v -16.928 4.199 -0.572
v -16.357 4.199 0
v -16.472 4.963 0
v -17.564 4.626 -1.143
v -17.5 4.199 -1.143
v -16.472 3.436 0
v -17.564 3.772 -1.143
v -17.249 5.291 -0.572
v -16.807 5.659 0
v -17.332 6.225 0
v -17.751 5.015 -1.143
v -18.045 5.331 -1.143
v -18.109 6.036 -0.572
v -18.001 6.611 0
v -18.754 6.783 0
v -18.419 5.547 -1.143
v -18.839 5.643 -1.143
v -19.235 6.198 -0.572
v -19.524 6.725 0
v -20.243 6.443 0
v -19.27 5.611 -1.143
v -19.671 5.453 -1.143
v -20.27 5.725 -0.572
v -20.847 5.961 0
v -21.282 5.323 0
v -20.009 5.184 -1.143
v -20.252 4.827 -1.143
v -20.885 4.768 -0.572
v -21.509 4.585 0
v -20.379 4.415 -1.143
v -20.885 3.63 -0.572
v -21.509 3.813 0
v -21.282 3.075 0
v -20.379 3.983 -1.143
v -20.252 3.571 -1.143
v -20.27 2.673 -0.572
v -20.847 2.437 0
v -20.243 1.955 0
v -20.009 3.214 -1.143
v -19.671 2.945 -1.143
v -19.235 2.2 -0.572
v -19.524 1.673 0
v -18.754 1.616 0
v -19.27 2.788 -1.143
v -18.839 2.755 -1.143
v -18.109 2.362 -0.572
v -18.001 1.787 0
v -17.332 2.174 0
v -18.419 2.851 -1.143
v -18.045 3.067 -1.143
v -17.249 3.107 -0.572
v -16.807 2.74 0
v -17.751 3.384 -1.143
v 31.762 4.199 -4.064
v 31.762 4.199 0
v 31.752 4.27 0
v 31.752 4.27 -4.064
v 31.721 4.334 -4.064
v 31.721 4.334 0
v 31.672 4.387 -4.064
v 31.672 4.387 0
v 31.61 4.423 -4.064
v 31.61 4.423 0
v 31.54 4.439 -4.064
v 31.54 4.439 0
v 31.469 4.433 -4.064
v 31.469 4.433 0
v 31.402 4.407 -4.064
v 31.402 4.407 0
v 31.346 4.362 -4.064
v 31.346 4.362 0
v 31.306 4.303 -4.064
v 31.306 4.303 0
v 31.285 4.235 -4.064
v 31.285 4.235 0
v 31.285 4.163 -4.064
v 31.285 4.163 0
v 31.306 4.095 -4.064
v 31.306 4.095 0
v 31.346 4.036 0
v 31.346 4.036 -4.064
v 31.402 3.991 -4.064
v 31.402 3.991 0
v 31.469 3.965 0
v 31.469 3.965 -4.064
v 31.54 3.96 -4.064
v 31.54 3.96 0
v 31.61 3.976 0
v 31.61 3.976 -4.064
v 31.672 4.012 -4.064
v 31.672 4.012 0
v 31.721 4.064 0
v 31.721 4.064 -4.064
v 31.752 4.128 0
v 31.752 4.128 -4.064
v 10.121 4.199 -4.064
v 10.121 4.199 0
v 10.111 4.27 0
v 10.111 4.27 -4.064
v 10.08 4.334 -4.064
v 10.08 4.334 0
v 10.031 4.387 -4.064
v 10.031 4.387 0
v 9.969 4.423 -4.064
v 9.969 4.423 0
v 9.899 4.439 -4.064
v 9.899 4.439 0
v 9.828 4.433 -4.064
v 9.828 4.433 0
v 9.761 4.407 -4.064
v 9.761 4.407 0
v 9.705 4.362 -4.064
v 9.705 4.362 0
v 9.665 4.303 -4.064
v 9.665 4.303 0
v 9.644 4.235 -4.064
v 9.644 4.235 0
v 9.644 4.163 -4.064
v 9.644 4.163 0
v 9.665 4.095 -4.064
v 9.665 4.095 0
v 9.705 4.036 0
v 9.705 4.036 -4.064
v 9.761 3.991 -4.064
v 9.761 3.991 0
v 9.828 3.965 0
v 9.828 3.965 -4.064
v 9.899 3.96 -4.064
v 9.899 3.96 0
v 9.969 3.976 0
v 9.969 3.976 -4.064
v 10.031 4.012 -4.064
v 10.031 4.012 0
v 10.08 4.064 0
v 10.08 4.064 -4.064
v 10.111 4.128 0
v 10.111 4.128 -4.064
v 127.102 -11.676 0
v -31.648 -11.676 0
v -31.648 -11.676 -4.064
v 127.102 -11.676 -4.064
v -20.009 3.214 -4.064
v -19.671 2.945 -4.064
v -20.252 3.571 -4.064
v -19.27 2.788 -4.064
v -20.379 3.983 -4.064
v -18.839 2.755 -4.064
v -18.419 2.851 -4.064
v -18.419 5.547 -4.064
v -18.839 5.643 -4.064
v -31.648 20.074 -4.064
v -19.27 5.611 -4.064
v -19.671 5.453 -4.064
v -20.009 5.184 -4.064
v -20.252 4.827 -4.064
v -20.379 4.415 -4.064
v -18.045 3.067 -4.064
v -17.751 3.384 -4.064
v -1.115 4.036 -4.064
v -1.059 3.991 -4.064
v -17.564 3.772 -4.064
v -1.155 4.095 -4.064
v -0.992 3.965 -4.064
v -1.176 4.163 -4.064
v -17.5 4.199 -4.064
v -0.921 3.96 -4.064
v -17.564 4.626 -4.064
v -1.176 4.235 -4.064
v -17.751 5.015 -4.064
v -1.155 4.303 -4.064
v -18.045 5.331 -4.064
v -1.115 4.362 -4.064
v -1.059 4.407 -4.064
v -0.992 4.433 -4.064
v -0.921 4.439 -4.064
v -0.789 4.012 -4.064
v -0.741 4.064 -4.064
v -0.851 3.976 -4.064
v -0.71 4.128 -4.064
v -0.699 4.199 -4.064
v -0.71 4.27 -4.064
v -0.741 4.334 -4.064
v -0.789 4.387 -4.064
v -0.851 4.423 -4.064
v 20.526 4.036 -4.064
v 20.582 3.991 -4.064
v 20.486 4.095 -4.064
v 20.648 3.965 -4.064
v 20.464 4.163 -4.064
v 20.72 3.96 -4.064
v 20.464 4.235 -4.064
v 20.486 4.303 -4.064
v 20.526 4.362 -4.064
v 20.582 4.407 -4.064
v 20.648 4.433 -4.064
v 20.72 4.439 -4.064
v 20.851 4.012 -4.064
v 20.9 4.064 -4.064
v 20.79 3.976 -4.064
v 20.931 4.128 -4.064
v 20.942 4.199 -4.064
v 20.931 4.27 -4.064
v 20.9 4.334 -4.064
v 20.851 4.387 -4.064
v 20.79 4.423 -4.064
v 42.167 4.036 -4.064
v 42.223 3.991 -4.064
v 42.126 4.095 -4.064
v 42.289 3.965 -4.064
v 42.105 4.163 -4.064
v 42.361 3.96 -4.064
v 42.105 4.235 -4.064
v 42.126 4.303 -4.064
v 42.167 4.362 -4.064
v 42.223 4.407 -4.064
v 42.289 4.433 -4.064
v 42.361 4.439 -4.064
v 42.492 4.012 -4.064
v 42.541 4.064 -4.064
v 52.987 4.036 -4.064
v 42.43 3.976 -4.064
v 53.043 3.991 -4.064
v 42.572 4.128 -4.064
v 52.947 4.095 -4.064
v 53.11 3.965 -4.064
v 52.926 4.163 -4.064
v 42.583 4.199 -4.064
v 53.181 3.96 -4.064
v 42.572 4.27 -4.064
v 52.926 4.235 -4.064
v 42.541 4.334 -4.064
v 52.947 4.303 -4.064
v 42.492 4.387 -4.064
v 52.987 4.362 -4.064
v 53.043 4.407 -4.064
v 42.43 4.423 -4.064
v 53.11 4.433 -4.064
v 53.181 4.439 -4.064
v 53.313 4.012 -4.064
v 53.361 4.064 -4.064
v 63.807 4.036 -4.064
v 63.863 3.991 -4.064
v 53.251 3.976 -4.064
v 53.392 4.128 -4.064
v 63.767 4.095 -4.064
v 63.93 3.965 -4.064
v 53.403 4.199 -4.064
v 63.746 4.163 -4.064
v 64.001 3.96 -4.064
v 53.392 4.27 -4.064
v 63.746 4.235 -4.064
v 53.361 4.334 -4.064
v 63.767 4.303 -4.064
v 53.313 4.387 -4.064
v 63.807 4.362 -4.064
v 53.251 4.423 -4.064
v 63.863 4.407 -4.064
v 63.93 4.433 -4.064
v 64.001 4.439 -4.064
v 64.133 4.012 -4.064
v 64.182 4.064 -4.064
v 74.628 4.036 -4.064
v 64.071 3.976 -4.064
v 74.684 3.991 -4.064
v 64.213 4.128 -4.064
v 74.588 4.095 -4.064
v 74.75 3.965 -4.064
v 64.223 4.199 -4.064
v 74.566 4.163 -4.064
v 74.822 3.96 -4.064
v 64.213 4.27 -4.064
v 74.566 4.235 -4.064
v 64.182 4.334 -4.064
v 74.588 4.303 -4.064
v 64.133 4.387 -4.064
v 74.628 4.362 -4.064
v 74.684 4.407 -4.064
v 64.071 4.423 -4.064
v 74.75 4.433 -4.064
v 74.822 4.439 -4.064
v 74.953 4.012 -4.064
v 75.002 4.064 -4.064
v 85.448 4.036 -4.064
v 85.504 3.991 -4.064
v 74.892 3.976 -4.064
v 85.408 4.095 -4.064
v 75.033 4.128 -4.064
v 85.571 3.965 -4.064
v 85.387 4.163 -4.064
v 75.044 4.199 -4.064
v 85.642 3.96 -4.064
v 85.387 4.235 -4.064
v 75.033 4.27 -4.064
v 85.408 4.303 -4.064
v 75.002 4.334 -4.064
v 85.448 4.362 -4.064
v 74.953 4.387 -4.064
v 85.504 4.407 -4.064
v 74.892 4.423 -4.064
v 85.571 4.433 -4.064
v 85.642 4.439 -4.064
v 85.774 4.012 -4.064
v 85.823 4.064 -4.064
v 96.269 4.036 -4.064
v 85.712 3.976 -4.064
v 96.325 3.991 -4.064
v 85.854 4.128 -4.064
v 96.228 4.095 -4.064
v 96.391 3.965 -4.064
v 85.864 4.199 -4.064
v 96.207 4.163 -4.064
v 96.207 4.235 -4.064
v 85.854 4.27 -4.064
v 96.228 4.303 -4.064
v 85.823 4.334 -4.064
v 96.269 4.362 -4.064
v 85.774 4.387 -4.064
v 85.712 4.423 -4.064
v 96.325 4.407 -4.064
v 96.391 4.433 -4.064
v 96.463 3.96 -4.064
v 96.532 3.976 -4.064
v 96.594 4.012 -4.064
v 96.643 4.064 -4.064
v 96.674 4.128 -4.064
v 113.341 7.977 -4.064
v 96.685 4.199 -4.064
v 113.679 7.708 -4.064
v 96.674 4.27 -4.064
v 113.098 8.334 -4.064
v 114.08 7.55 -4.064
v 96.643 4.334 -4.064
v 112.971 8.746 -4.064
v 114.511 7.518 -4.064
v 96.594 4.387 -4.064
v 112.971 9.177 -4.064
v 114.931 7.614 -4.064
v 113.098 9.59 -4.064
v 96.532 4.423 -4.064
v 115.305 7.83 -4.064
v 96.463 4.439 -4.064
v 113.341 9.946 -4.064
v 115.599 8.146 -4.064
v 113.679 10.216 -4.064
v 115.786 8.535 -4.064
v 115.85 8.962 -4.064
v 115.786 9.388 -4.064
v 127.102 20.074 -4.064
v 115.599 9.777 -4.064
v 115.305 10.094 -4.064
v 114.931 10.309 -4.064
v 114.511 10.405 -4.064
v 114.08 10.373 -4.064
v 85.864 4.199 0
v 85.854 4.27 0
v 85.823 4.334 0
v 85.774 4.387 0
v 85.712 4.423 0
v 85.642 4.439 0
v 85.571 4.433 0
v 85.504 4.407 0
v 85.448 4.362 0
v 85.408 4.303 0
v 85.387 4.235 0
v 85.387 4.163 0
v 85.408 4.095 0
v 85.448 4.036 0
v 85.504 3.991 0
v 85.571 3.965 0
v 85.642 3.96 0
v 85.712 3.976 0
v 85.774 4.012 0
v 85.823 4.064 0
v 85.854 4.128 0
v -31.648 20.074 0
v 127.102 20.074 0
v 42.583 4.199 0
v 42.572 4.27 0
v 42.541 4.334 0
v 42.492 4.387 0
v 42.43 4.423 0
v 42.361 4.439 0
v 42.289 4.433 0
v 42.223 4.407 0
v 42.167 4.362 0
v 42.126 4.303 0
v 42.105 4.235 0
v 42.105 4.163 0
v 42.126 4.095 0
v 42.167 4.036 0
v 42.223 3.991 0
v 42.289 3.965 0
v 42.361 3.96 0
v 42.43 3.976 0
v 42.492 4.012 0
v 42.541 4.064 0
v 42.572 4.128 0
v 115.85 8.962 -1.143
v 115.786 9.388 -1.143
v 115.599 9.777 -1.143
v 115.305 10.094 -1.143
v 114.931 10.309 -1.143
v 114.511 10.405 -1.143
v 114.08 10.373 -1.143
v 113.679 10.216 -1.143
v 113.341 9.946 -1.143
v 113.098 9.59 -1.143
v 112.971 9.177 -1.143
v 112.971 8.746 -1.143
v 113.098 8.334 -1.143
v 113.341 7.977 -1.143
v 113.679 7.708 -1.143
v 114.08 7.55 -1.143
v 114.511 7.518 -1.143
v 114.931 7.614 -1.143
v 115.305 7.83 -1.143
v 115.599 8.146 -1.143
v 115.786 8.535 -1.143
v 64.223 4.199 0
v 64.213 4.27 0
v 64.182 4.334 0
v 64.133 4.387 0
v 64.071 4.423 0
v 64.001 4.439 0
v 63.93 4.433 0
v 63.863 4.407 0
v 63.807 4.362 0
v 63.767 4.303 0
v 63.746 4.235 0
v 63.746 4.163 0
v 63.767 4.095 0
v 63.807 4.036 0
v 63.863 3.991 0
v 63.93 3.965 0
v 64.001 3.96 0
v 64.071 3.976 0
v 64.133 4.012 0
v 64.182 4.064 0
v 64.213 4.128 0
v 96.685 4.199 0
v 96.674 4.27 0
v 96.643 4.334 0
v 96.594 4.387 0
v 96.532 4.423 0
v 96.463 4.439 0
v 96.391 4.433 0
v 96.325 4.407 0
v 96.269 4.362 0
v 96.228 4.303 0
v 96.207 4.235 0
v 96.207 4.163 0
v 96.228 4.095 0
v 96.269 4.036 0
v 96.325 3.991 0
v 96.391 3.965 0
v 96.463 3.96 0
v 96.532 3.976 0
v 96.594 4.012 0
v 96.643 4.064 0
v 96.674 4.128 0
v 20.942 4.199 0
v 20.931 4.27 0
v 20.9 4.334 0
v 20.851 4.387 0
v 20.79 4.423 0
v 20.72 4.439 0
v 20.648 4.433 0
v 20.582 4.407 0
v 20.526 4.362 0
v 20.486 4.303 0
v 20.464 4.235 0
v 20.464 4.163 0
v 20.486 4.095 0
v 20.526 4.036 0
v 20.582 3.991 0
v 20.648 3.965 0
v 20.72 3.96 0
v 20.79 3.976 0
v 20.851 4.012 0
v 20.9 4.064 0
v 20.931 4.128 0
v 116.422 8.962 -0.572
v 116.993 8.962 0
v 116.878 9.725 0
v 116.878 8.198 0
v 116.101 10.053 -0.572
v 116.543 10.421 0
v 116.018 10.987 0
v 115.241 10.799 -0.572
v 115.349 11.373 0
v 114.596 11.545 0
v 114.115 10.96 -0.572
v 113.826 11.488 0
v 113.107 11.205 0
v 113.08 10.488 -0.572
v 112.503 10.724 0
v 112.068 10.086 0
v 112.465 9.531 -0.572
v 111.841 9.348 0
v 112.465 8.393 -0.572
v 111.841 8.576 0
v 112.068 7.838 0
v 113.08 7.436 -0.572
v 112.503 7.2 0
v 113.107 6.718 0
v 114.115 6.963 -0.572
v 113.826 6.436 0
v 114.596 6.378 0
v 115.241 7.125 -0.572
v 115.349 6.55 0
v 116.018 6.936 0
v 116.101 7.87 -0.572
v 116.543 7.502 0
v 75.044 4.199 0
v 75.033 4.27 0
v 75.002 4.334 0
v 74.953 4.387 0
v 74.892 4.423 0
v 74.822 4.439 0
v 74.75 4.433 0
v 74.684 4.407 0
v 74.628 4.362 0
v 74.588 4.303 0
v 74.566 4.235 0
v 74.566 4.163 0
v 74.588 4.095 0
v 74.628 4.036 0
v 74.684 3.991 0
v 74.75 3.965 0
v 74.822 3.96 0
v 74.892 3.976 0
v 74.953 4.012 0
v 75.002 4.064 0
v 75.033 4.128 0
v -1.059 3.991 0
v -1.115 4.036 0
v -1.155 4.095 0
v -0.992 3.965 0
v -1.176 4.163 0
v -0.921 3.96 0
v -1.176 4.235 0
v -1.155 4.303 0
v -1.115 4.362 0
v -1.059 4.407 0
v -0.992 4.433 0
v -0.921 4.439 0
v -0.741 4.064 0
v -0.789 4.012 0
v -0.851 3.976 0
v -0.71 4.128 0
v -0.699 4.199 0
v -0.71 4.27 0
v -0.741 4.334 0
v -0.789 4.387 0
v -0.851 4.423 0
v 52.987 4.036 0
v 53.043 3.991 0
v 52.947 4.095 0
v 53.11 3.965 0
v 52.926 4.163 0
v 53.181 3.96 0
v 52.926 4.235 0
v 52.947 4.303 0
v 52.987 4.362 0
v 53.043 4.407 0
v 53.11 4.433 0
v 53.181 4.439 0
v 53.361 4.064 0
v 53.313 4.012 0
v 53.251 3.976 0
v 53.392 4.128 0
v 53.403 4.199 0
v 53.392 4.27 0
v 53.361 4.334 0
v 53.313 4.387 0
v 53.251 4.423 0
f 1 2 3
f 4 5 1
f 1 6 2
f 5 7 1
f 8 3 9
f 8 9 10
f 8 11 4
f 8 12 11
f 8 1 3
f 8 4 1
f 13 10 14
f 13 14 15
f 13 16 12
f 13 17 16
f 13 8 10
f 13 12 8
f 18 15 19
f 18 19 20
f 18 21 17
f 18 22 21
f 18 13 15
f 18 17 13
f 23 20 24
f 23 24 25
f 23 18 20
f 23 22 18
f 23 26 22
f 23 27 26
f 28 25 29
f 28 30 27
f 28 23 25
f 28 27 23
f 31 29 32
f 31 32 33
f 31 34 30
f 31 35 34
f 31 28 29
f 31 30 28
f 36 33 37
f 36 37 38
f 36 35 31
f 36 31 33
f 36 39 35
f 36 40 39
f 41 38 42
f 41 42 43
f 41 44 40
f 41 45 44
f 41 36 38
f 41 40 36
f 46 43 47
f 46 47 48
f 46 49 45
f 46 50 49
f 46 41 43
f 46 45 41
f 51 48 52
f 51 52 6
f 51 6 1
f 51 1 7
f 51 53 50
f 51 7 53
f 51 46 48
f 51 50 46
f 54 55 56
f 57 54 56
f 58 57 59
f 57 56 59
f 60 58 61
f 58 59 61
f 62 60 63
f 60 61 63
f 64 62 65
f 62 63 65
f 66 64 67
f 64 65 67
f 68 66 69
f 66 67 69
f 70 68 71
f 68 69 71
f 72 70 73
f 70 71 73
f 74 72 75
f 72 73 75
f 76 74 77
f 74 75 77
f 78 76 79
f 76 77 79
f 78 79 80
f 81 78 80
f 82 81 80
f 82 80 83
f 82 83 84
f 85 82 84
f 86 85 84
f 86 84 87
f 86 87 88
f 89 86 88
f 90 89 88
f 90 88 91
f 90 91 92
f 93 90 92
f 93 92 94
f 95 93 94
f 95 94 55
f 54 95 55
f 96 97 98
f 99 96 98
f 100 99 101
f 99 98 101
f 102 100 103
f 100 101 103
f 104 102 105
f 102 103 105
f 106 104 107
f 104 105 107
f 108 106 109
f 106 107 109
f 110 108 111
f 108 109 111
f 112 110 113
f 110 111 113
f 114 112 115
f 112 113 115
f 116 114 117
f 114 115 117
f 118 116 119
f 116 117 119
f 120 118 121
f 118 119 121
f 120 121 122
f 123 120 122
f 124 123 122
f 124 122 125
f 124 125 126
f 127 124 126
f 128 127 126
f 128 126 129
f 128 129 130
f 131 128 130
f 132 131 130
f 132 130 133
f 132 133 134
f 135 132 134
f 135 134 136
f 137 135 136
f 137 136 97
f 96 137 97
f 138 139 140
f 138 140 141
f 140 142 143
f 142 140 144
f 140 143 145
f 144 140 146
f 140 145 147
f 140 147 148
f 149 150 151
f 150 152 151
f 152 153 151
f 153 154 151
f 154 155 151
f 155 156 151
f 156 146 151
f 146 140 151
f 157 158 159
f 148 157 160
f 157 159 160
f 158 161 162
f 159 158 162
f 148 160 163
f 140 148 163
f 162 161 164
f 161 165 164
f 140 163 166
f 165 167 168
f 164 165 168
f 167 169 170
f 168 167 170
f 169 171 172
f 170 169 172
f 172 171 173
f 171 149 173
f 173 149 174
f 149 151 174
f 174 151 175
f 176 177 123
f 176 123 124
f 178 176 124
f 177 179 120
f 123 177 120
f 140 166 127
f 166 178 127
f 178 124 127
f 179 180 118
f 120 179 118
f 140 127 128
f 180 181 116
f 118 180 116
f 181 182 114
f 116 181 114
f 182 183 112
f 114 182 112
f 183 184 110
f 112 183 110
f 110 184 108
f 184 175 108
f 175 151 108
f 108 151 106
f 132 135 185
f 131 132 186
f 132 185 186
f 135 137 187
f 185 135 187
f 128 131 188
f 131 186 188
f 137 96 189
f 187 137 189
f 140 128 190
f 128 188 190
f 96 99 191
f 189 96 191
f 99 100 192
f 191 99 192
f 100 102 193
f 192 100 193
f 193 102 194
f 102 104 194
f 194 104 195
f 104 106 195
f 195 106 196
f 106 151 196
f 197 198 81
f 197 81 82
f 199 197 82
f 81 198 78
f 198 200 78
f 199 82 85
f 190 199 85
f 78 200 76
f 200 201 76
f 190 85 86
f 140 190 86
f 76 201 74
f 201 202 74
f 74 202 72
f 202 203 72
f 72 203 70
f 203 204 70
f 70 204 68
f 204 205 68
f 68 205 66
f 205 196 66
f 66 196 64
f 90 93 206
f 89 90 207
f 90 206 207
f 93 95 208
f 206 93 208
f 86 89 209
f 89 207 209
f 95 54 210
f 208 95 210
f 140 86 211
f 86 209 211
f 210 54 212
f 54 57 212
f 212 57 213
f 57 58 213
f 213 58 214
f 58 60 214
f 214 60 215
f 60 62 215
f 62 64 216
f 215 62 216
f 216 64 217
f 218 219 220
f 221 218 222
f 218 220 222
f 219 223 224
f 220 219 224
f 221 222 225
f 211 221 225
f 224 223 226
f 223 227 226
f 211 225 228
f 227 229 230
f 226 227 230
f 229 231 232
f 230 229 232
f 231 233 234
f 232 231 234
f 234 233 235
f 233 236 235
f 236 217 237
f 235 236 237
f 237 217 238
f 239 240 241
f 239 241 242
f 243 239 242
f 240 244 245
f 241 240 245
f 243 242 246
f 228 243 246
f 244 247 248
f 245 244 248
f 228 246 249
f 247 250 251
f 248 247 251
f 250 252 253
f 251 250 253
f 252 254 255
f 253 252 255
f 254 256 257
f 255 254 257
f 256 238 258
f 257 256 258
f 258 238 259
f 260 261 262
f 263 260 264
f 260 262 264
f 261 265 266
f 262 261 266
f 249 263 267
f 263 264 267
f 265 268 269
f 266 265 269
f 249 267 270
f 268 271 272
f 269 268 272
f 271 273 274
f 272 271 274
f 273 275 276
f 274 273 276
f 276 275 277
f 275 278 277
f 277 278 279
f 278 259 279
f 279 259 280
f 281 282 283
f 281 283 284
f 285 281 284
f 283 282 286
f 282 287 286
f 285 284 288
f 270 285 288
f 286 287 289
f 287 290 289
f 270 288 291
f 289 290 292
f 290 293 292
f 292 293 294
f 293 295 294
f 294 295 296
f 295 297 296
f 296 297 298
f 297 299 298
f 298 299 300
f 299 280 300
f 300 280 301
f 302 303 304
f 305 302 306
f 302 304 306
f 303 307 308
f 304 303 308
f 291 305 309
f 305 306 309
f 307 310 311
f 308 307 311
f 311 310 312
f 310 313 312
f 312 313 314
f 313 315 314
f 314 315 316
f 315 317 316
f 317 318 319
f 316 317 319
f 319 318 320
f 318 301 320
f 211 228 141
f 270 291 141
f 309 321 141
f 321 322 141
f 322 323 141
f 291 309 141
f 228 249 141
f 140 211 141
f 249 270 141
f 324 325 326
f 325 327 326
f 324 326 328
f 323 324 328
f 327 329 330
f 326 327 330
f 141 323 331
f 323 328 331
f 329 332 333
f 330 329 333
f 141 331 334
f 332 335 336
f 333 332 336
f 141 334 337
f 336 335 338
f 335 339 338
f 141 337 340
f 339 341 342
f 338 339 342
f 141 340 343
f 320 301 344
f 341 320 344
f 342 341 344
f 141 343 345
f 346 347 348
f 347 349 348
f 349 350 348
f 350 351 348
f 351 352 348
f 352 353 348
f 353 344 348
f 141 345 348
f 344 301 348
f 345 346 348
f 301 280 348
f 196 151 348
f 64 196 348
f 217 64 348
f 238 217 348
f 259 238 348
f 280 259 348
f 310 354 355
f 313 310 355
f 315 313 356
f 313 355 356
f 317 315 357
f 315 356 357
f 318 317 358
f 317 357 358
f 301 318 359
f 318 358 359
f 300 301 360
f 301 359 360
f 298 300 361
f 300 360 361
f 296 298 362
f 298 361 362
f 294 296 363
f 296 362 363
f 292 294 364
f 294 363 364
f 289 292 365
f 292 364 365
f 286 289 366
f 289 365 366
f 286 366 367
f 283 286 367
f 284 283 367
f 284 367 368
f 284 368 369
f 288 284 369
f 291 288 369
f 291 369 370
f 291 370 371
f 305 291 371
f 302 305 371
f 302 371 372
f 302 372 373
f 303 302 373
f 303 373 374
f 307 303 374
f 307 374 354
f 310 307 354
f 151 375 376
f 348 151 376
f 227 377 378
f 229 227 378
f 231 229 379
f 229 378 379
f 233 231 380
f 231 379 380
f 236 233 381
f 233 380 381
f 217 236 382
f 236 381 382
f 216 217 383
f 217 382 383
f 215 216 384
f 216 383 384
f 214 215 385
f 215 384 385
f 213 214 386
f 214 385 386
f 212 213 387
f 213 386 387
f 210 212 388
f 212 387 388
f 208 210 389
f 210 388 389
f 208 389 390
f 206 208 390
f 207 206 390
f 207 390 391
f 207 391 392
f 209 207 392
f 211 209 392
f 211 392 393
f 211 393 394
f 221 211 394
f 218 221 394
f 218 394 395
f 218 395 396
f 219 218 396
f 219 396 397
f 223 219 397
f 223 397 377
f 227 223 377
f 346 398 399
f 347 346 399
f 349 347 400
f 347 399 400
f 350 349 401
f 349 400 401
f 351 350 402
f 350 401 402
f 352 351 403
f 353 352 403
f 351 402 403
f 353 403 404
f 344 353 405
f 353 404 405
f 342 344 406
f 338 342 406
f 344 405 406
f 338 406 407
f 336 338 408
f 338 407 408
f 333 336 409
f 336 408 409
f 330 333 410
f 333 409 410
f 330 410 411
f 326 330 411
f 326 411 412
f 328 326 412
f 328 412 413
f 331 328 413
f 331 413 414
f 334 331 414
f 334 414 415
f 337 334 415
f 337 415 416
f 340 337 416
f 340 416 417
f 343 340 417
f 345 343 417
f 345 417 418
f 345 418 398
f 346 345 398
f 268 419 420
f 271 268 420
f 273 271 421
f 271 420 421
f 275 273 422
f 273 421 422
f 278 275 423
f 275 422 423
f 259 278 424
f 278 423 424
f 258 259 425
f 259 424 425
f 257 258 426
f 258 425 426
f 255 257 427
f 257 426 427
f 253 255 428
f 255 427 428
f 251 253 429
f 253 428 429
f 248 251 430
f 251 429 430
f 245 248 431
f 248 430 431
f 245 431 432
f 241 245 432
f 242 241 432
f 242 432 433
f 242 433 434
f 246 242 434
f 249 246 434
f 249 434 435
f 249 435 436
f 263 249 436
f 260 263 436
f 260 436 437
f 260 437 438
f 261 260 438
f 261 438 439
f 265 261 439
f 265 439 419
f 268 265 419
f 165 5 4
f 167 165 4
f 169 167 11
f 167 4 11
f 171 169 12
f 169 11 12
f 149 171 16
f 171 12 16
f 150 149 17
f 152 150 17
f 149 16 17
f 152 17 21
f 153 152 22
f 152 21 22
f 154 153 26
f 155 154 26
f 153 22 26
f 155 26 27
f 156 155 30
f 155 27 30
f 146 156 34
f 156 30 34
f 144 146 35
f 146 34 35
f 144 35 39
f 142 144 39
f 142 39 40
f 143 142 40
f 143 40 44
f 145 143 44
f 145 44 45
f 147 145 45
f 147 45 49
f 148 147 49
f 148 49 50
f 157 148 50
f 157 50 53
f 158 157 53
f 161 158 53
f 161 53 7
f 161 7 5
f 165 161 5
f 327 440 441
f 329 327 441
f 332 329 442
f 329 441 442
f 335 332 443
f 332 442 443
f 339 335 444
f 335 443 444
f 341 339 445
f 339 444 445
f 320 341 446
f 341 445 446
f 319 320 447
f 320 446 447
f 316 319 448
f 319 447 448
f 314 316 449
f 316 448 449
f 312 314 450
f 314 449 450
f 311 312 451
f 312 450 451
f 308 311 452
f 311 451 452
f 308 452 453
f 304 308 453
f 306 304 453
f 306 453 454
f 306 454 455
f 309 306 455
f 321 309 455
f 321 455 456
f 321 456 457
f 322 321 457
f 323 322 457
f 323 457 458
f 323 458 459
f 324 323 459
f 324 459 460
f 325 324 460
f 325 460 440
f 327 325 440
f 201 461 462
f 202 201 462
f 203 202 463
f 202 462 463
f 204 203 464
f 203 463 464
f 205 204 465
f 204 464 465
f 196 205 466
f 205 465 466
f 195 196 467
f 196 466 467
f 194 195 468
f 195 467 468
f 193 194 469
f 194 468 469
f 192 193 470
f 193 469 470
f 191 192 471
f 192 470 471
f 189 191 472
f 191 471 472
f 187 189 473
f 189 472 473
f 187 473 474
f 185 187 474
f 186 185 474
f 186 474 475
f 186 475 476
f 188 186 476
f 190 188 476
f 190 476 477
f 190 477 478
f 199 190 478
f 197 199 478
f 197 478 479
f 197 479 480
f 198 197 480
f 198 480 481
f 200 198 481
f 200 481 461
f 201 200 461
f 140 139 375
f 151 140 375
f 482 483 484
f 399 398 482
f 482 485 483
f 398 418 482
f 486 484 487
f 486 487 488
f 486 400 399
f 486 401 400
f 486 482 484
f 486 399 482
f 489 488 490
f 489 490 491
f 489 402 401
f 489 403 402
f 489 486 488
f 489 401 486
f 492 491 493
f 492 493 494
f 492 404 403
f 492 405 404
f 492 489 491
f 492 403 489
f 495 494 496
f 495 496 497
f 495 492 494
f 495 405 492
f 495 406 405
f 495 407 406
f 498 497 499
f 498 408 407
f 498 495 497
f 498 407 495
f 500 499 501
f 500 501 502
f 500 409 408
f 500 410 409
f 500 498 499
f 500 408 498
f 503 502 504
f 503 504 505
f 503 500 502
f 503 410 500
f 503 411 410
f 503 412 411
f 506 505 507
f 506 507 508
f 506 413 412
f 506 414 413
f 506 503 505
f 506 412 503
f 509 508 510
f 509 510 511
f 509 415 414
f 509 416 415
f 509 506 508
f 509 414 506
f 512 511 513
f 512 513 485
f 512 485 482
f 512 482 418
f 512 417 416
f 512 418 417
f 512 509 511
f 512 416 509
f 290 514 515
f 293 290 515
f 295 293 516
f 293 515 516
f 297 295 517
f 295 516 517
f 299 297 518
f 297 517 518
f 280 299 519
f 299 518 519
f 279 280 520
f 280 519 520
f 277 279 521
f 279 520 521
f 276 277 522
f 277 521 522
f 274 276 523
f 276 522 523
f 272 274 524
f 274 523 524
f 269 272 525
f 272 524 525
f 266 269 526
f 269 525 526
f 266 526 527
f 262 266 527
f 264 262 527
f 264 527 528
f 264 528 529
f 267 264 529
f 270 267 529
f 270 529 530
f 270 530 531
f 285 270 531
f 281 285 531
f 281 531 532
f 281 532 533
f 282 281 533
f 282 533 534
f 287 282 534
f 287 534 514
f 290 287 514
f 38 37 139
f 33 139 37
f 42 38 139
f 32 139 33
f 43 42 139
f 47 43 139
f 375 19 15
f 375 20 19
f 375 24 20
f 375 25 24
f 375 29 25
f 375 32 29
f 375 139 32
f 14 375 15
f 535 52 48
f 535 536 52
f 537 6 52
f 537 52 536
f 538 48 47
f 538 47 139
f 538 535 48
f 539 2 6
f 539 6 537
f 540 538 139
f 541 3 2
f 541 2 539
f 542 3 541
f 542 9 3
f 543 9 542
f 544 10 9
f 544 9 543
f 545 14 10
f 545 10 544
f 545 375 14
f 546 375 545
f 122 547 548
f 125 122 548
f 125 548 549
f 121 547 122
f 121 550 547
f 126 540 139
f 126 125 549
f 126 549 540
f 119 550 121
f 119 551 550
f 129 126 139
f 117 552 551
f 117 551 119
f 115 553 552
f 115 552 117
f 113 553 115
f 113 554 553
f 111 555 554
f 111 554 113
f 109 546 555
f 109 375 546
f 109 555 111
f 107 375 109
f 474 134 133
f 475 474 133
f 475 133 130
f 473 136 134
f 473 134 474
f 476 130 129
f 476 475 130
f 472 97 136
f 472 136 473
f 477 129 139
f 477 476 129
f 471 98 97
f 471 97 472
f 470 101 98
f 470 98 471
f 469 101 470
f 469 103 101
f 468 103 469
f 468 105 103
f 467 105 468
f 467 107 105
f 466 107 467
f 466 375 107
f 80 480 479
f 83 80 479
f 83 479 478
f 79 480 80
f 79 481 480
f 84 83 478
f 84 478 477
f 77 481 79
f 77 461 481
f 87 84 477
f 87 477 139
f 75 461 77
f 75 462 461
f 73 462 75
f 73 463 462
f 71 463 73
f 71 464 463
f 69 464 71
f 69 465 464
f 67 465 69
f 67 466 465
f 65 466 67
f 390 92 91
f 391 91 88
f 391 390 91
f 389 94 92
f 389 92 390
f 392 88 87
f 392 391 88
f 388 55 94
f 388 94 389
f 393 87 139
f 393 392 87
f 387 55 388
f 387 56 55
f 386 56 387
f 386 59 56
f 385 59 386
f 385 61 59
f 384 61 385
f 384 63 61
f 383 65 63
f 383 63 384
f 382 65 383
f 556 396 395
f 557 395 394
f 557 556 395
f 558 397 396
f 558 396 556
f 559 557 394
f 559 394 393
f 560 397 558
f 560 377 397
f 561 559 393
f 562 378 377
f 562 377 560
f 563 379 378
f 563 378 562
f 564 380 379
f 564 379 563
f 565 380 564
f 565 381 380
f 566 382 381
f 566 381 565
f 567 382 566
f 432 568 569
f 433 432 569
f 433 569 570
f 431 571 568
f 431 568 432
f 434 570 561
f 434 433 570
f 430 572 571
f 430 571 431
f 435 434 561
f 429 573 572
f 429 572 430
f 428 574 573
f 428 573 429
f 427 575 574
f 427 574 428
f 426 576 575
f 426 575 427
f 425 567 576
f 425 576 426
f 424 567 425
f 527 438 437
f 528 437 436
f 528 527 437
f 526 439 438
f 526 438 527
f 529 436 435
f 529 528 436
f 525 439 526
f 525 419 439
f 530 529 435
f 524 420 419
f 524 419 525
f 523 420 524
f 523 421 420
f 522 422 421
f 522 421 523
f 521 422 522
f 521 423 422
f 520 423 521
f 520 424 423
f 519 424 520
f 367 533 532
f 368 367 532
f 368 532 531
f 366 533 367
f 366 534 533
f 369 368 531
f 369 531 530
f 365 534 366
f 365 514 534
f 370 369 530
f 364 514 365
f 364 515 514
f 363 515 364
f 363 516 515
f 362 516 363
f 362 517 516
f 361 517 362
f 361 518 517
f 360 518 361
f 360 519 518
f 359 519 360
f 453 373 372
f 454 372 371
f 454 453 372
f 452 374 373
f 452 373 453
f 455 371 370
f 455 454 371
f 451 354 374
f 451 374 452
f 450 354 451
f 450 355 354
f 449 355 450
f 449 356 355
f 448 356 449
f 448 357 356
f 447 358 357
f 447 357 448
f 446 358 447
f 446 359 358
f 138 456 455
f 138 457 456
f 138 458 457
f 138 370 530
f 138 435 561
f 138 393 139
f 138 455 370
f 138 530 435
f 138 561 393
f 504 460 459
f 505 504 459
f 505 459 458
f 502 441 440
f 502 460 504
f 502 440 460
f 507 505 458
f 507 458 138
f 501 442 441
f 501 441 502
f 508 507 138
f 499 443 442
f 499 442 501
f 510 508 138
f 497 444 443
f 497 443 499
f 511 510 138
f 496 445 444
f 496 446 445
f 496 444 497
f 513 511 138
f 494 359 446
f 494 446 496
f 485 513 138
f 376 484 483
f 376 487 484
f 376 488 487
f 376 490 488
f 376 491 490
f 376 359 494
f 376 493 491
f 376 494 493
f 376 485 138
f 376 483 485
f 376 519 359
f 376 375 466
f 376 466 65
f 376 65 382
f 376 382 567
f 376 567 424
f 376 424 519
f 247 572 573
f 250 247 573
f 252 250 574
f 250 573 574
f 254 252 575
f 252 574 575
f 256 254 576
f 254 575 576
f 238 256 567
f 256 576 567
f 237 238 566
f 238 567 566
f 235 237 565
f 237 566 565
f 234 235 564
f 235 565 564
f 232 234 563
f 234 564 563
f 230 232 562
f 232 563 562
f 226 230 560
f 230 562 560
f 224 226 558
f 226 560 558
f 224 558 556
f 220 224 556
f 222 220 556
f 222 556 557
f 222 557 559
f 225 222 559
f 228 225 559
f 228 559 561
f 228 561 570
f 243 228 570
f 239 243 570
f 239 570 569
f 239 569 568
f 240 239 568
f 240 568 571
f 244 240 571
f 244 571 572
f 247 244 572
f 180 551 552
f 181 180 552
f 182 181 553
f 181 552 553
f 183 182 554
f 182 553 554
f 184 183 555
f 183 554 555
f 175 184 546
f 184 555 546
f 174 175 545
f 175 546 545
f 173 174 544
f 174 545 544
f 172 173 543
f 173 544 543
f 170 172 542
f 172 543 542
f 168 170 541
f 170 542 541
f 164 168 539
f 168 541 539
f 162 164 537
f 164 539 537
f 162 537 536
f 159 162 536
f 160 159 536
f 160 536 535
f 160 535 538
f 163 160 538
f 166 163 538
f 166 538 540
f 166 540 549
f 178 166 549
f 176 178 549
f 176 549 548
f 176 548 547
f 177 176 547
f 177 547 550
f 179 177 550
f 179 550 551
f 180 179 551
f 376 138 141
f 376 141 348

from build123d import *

# Parameters (mm, degrees)
SKETCH1_W           = 158.75
SKETCH1_H           = 31.75
BOSS_EXTRUDE1_DEPTH = 4.064
SKETCH2_R           = 1.4478
CUT_EXTRUDE1_DEPTH  = 5.064
CHAMFER1_SIZE       = 1.143
SKETCH4_R           = 0.24003
CUT_EXTRUDE2_DEPTH  = 5.064
LPATTERN1_COUNT     = 10
LPATTERN1_PITCH     = 10.8204


with BuildPart() as part:
    # Sketch1 → Boss-Extrude1 (new body)
    with BuildSketch(Plane.XY):
        with Locations((47.727419355, 4.199193548)):
            Rectangle(SKETCH1_W, SKETCH1_H)
    extrude(amount=-BOSS_EXTRUDE1_DEPTH)

    # Sketch2 → Cut-Extrude1 (cut, through all)
    with BuildSketch(Plane.XY):
        with Locations((-18.947580645, 4.199193548)):
            Circle(SKETCH2_R)
        with Locations((114.402419355, 8.961693548)):
            Circle(SKETCH2_R)
    extrude(amount=-CUT_EXTRUDE1_DEPTH, mode=Mode.SUBTRACT)

    # Chamfer1
    chamfer1_edges = [part.edges().sort_by_distance(p)[0] for p in [
        (-20.395380645, 4.199193548, 0),
        (112.954619355, 8.961693548, 0),
    ]]
    chamfer(chamfer1_edges, length=CHAMFER1_SIZE)

    # Sketch4 → Cut-Extrude2 (cut, through all)
    with BuildSketch(Plane.XY):
        with Locations((-0.938980645, 4.199193548)):
            Circle(SKETCH4_R)
    cut_extrude2 = extrude(amount=-CUT_EXTRUDE2_DEPTH, mode=Mode.SUBTRACT)

    # LPattern1: Cut-Extrude2 ×10
    with Locations(*[(i * LPATTERN1_PITCH, 0, 0) for i in range(1, LPATTERN1_COUNT)]):
        add(cut_extrude2, mode=Mode.SUBTRACT)


solid = part.part
